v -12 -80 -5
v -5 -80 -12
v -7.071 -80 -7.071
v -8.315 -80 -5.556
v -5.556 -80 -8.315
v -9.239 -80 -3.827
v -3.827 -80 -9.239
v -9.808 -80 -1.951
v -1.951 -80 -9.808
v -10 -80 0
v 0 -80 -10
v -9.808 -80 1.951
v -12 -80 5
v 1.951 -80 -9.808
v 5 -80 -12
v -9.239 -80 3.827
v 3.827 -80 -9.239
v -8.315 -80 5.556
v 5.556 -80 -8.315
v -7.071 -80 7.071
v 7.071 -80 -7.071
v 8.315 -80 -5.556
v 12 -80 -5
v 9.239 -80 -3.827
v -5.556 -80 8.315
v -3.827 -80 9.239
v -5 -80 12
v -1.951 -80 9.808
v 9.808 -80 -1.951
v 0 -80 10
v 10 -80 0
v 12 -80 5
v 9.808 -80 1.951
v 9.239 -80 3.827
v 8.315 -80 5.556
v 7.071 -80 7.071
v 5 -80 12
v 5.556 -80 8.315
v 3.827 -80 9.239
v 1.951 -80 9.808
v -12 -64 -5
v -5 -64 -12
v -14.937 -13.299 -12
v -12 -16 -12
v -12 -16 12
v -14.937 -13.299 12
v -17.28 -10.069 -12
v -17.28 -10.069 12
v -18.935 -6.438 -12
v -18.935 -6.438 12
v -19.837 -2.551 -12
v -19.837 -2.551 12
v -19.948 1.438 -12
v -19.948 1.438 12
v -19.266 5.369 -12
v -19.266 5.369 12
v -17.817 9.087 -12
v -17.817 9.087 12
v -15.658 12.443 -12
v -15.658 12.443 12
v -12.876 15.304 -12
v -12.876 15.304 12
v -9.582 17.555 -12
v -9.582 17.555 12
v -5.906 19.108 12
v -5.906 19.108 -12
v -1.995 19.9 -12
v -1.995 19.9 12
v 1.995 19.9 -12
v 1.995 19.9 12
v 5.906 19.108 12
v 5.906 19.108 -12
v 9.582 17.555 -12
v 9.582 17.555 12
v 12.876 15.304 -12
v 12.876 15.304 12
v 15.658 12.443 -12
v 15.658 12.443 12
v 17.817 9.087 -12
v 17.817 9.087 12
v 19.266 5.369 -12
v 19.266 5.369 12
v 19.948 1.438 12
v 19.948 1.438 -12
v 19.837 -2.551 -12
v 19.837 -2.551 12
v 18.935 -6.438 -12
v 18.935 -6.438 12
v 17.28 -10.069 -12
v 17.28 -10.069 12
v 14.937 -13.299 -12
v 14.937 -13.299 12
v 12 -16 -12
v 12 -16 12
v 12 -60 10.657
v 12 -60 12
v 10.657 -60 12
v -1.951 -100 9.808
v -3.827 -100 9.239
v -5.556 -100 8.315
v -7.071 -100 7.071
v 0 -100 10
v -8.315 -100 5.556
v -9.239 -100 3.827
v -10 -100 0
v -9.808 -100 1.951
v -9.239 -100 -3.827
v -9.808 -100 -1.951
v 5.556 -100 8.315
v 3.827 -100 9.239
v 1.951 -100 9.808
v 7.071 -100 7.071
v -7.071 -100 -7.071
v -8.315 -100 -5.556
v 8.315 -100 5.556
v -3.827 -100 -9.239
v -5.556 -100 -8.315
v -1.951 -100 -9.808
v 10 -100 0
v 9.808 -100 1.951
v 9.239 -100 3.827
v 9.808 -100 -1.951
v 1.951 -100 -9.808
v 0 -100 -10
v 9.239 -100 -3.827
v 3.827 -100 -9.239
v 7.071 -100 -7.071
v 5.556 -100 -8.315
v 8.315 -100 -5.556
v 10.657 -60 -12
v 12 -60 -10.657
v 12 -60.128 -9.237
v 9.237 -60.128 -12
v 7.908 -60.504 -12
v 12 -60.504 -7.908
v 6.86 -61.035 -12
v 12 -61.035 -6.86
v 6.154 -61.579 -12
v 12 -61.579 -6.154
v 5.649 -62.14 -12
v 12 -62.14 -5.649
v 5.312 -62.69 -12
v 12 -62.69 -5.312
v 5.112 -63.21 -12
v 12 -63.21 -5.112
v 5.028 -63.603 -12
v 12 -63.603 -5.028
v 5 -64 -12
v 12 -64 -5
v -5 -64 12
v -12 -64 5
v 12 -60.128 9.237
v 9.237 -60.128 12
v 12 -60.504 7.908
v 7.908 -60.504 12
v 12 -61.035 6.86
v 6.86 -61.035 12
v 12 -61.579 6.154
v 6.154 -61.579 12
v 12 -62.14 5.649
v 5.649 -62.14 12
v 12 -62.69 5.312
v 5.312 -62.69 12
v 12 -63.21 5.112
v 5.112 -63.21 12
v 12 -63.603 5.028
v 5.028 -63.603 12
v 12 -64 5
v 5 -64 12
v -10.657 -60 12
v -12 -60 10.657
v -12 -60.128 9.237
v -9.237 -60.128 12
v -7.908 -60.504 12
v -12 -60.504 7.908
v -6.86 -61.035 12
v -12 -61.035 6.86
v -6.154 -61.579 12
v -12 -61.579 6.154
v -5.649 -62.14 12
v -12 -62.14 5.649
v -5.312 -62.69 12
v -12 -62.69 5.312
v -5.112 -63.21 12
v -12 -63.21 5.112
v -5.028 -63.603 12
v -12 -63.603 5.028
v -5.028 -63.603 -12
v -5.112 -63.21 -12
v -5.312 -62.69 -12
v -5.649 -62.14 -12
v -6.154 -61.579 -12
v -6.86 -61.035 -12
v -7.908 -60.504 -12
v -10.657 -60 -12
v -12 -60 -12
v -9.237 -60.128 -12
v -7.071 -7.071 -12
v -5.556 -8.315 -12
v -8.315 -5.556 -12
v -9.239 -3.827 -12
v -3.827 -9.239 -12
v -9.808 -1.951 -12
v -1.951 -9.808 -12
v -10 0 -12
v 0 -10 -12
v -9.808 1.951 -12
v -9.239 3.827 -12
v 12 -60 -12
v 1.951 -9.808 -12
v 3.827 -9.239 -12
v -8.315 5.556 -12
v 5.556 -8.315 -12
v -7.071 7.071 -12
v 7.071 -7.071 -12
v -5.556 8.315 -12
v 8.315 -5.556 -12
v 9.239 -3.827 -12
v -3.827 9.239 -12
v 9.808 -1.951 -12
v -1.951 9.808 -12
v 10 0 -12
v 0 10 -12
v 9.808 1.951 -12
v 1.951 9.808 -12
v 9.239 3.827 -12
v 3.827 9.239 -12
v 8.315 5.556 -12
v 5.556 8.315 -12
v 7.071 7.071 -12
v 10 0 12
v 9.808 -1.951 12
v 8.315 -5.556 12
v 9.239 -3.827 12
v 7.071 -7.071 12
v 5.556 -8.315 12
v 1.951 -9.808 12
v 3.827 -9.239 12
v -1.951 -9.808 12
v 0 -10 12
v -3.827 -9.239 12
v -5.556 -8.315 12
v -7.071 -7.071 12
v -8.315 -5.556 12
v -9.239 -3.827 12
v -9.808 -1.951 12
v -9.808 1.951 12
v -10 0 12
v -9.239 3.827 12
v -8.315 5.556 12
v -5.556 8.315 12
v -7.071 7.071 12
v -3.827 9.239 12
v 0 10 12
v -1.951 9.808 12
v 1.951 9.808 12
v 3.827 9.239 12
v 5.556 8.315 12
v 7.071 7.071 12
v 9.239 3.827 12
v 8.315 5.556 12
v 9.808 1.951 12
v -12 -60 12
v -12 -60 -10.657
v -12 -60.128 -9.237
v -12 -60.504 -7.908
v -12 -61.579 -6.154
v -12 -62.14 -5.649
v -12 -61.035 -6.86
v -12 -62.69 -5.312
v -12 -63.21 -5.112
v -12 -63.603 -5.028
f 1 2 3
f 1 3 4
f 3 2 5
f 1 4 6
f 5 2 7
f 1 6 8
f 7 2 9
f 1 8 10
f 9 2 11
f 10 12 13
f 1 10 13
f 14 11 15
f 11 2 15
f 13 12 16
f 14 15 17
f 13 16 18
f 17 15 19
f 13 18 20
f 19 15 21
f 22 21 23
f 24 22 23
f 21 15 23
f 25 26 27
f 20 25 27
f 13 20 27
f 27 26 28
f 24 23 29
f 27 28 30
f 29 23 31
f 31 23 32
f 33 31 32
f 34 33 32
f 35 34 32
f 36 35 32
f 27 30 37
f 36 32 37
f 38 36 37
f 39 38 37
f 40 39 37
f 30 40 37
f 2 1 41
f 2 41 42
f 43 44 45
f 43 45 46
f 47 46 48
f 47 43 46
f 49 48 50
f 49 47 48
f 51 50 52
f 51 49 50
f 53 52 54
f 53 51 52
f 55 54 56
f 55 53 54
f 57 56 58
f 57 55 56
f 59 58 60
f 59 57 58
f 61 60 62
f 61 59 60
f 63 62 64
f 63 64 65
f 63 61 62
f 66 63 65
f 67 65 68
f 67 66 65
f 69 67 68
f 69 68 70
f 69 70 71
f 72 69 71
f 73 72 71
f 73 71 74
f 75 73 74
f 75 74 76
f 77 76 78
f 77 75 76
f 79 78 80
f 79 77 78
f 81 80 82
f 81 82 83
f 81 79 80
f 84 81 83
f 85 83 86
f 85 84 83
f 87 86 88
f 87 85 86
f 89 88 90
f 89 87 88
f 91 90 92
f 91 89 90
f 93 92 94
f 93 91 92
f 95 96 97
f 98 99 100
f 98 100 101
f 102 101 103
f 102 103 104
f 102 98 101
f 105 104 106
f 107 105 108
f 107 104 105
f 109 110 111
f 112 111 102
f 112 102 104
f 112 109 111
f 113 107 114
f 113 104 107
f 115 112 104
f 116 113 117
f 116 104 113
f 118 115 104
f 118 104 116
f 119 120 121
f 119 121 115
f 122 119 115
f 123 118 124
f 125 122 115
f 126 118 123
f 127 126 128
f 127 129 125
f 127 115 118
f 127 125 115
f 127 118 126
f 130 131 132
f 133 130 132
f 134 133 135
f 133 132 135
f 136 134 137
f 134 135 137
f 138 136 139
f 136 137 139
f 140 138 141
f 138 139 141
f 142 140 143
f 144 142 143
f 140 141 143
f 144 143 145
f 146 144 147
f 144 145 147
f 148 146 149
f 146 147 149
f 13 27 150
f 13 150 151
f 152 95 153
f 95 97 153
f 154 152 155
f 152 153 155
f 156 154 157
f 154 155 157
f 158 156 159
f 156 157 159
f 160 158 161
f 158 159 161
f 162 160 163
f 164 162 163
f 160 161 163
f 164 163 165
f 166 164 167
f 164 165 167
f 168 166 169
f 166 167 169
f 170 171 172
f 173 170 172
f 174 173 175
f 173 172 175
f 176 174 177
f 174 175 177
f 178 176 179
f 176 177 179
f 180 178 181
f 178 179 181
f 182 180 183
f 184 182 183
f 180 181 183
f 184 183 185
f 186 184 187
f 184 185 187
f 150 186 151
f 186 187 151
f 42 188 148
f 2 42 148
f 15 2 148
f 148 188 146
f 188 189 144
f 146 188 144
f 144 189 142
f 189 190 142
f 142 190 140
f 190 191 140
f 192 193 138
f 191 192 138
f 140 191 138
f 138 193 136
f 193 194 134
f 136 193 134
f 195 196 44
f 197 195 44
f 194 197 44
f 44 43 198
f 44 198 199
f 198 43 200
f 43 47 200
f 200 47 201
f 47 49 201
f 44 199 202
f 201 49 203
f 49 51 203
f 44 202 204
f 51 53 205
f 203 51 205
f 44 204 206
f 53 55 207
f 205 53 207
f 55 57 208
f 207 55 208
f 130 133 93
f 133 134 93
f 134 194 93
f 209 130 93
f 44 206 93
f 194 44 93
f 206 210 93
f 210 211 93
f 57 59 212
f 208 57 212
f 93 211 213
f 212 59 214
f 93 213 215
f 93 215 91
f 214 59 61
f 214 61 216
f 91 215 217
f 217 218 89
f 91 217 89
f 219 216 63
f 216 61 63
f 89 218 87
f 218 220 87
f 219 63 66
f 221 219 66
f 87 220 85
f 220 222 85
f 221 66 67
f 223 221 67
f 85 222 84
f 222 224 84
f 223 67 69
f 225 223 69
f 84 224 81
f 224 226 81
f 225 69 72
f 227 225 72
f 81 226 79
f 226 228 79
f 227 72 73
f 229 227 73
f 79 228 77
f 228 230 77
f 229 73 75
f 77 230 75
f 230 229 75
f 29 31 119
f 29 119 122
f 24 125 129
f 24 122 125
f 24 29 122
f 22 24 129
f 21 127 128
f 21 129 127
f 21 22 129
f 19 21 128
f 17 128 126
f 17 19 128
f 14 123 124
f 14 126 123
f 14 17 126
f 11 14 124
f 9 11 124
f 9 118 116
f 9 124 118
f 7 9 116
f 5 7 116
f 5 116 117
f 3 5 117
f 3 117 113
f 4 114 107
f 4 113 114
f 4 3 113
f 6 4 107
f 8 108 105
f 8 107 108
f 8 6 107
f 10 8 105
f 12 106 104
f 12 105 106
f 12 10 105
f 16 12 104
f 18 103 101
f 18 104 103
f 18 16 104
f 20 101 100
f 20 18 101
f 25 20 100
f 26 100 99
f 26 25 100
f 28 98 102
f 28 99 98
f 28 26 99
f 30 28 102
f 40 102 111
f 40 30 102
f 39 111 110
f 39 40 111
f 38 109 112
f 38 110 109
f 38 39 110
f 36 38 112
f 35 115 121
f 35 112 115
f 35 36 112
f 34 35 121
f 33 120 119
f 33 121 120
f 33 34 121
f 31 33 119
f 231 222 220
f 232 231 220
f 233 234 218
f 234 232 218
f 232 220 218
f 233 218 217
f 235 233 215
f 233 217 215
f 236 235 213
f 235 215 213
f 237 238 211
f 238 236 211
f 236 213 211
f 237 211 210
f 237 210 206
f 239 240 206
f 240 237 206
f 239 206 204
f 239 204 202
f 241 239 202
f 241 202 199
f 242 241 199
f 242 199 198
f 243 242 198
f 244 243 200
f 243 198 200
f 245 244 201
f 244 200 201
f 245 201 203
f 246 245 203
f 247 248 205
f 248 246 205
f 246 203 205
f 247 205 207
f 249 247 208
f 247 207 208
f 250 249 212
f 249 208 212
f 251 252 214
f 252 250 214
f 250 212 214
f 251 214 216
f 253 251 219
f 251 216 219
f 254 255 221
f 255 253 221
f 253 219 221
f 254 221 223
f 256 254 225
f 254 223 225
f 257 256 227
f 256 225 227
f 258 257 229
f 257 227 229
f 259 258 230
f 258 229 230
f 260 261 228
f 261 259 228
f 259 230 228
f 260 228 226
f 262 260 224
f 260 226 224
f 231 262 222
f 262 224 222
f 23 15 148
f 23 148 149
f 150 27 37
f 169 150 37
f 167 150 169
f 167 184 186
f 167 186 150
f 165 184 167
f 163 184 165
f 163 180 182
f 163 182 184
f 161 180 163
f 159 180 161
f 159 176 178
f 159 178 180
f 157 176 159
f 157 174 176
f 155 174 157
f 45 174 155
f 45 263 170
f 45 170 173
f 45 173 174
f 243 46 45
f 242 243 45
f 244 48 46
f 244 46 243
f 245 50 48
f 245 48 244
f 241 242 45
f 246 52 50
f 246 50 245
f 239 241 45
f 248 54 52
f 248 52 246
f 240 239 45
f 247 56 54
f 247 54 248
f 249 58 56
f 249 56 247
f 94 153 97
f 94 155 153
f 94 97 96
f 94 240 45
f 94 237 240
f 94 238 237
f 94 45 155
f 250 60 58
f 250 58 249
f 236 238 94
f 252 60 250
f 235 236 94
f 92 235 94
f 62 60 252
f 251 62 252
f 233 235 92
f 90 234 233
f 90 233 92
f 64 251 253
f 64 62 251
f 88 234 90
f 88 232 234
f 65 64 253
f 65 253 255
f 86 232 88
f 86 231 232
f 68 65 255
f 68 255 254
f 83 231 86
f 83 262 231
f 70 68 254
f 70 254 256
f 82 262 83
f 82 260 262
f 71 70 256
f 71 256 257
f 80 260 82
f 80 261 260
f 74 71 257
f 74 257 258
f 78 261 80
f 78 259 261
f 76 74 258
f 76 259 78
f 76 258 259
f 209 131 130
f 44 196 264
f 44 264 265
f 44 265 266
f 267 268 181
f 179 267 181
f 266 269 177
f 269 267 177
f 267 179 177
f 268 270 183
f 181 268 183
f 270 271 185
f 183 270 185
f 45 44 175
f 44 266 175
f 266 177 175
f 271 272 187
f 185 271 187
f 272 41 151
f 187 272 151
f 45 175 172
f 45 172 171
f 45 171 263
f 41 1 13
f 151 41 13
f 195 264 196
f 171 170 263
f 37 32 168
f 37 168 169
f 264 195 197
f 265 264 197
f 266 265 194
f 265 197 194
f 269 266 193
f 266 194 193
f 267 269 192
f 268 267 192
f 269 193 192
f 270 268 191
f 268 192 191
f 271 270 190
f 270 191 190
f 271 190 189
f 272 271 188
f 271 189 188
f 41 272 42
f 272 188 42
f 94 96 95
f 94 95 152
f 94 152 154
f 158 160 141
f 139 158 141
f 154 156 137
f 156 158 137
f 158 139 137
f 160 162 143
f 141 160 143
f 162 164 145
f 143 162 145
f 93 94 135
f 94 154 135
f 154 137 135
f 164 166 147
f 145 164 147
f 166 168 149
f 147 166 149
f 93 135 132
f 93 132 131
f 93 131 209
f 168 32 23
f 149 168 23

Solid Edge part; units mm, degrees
sketch "Sketch1" plane through (0, 0, 0) normal (0, 0, 1) x (1, 0, 0)
  circle A0 centre (0, 0) radius 10
  circle A1 centre (0, 0) radius 20
extrude "Protrusion1" add sketch "Sketch1" along normal mid plane 24
sketch "Sketch2" plane through (0, -80, 0) normal (0, -1, 0) x (1, 0, 0)
  line L0 (-12, 12) -> (12, 12)
  line L1 (12, 12) -> (12, -12)
  line L2 (12, -12) -> (-12, -12)
  line L3 (-12, -12) -> (-12, 12)
  dimension "D1" = 24
  dimension "D2" = 24
extrude "Protrusion2" add sketch "Sketch2" against normal up to next
sketch "Sketch3" plane through (0, -80, 0) normal (0, -1, 0) x (1, 0, 0)
  circle A0 centre (0, 0) radius 10
extrude "ExtrudedProtrusion_3" add sketch "Sketch3" along normal blind 20
sketch "Sketch4" plane through (0, -80, 0) normal (0, -1, 0) x (1, 0, 0)
  line L0 (-5, 12) -> (5, 12)
  line L1 (12, 5) -> (5, 12)
  line L2 (12, -5) -> (12, 5)
  line L3 (5, -12) -> (12, -5)
  line L4 (-5, -12) -> (5, -12)
  line L5 (-12, -5) -> (-5, -12)
  line L6 (-12, -5) -> (-12, 5)
  line L7 (-5, 12) -> (-12, 5)
extrude "ExtrudedCutout_1" cut sketch "Sketch4" against normal blind 20 flip side to cut
fillet "Round_1" radius 4 4 edges at (-8.5, -60, 8.5) (8.5, -60, 8.5) (-8.5, -60, -8.5) (8.5, -60, -8.5)
properties part number "2"
